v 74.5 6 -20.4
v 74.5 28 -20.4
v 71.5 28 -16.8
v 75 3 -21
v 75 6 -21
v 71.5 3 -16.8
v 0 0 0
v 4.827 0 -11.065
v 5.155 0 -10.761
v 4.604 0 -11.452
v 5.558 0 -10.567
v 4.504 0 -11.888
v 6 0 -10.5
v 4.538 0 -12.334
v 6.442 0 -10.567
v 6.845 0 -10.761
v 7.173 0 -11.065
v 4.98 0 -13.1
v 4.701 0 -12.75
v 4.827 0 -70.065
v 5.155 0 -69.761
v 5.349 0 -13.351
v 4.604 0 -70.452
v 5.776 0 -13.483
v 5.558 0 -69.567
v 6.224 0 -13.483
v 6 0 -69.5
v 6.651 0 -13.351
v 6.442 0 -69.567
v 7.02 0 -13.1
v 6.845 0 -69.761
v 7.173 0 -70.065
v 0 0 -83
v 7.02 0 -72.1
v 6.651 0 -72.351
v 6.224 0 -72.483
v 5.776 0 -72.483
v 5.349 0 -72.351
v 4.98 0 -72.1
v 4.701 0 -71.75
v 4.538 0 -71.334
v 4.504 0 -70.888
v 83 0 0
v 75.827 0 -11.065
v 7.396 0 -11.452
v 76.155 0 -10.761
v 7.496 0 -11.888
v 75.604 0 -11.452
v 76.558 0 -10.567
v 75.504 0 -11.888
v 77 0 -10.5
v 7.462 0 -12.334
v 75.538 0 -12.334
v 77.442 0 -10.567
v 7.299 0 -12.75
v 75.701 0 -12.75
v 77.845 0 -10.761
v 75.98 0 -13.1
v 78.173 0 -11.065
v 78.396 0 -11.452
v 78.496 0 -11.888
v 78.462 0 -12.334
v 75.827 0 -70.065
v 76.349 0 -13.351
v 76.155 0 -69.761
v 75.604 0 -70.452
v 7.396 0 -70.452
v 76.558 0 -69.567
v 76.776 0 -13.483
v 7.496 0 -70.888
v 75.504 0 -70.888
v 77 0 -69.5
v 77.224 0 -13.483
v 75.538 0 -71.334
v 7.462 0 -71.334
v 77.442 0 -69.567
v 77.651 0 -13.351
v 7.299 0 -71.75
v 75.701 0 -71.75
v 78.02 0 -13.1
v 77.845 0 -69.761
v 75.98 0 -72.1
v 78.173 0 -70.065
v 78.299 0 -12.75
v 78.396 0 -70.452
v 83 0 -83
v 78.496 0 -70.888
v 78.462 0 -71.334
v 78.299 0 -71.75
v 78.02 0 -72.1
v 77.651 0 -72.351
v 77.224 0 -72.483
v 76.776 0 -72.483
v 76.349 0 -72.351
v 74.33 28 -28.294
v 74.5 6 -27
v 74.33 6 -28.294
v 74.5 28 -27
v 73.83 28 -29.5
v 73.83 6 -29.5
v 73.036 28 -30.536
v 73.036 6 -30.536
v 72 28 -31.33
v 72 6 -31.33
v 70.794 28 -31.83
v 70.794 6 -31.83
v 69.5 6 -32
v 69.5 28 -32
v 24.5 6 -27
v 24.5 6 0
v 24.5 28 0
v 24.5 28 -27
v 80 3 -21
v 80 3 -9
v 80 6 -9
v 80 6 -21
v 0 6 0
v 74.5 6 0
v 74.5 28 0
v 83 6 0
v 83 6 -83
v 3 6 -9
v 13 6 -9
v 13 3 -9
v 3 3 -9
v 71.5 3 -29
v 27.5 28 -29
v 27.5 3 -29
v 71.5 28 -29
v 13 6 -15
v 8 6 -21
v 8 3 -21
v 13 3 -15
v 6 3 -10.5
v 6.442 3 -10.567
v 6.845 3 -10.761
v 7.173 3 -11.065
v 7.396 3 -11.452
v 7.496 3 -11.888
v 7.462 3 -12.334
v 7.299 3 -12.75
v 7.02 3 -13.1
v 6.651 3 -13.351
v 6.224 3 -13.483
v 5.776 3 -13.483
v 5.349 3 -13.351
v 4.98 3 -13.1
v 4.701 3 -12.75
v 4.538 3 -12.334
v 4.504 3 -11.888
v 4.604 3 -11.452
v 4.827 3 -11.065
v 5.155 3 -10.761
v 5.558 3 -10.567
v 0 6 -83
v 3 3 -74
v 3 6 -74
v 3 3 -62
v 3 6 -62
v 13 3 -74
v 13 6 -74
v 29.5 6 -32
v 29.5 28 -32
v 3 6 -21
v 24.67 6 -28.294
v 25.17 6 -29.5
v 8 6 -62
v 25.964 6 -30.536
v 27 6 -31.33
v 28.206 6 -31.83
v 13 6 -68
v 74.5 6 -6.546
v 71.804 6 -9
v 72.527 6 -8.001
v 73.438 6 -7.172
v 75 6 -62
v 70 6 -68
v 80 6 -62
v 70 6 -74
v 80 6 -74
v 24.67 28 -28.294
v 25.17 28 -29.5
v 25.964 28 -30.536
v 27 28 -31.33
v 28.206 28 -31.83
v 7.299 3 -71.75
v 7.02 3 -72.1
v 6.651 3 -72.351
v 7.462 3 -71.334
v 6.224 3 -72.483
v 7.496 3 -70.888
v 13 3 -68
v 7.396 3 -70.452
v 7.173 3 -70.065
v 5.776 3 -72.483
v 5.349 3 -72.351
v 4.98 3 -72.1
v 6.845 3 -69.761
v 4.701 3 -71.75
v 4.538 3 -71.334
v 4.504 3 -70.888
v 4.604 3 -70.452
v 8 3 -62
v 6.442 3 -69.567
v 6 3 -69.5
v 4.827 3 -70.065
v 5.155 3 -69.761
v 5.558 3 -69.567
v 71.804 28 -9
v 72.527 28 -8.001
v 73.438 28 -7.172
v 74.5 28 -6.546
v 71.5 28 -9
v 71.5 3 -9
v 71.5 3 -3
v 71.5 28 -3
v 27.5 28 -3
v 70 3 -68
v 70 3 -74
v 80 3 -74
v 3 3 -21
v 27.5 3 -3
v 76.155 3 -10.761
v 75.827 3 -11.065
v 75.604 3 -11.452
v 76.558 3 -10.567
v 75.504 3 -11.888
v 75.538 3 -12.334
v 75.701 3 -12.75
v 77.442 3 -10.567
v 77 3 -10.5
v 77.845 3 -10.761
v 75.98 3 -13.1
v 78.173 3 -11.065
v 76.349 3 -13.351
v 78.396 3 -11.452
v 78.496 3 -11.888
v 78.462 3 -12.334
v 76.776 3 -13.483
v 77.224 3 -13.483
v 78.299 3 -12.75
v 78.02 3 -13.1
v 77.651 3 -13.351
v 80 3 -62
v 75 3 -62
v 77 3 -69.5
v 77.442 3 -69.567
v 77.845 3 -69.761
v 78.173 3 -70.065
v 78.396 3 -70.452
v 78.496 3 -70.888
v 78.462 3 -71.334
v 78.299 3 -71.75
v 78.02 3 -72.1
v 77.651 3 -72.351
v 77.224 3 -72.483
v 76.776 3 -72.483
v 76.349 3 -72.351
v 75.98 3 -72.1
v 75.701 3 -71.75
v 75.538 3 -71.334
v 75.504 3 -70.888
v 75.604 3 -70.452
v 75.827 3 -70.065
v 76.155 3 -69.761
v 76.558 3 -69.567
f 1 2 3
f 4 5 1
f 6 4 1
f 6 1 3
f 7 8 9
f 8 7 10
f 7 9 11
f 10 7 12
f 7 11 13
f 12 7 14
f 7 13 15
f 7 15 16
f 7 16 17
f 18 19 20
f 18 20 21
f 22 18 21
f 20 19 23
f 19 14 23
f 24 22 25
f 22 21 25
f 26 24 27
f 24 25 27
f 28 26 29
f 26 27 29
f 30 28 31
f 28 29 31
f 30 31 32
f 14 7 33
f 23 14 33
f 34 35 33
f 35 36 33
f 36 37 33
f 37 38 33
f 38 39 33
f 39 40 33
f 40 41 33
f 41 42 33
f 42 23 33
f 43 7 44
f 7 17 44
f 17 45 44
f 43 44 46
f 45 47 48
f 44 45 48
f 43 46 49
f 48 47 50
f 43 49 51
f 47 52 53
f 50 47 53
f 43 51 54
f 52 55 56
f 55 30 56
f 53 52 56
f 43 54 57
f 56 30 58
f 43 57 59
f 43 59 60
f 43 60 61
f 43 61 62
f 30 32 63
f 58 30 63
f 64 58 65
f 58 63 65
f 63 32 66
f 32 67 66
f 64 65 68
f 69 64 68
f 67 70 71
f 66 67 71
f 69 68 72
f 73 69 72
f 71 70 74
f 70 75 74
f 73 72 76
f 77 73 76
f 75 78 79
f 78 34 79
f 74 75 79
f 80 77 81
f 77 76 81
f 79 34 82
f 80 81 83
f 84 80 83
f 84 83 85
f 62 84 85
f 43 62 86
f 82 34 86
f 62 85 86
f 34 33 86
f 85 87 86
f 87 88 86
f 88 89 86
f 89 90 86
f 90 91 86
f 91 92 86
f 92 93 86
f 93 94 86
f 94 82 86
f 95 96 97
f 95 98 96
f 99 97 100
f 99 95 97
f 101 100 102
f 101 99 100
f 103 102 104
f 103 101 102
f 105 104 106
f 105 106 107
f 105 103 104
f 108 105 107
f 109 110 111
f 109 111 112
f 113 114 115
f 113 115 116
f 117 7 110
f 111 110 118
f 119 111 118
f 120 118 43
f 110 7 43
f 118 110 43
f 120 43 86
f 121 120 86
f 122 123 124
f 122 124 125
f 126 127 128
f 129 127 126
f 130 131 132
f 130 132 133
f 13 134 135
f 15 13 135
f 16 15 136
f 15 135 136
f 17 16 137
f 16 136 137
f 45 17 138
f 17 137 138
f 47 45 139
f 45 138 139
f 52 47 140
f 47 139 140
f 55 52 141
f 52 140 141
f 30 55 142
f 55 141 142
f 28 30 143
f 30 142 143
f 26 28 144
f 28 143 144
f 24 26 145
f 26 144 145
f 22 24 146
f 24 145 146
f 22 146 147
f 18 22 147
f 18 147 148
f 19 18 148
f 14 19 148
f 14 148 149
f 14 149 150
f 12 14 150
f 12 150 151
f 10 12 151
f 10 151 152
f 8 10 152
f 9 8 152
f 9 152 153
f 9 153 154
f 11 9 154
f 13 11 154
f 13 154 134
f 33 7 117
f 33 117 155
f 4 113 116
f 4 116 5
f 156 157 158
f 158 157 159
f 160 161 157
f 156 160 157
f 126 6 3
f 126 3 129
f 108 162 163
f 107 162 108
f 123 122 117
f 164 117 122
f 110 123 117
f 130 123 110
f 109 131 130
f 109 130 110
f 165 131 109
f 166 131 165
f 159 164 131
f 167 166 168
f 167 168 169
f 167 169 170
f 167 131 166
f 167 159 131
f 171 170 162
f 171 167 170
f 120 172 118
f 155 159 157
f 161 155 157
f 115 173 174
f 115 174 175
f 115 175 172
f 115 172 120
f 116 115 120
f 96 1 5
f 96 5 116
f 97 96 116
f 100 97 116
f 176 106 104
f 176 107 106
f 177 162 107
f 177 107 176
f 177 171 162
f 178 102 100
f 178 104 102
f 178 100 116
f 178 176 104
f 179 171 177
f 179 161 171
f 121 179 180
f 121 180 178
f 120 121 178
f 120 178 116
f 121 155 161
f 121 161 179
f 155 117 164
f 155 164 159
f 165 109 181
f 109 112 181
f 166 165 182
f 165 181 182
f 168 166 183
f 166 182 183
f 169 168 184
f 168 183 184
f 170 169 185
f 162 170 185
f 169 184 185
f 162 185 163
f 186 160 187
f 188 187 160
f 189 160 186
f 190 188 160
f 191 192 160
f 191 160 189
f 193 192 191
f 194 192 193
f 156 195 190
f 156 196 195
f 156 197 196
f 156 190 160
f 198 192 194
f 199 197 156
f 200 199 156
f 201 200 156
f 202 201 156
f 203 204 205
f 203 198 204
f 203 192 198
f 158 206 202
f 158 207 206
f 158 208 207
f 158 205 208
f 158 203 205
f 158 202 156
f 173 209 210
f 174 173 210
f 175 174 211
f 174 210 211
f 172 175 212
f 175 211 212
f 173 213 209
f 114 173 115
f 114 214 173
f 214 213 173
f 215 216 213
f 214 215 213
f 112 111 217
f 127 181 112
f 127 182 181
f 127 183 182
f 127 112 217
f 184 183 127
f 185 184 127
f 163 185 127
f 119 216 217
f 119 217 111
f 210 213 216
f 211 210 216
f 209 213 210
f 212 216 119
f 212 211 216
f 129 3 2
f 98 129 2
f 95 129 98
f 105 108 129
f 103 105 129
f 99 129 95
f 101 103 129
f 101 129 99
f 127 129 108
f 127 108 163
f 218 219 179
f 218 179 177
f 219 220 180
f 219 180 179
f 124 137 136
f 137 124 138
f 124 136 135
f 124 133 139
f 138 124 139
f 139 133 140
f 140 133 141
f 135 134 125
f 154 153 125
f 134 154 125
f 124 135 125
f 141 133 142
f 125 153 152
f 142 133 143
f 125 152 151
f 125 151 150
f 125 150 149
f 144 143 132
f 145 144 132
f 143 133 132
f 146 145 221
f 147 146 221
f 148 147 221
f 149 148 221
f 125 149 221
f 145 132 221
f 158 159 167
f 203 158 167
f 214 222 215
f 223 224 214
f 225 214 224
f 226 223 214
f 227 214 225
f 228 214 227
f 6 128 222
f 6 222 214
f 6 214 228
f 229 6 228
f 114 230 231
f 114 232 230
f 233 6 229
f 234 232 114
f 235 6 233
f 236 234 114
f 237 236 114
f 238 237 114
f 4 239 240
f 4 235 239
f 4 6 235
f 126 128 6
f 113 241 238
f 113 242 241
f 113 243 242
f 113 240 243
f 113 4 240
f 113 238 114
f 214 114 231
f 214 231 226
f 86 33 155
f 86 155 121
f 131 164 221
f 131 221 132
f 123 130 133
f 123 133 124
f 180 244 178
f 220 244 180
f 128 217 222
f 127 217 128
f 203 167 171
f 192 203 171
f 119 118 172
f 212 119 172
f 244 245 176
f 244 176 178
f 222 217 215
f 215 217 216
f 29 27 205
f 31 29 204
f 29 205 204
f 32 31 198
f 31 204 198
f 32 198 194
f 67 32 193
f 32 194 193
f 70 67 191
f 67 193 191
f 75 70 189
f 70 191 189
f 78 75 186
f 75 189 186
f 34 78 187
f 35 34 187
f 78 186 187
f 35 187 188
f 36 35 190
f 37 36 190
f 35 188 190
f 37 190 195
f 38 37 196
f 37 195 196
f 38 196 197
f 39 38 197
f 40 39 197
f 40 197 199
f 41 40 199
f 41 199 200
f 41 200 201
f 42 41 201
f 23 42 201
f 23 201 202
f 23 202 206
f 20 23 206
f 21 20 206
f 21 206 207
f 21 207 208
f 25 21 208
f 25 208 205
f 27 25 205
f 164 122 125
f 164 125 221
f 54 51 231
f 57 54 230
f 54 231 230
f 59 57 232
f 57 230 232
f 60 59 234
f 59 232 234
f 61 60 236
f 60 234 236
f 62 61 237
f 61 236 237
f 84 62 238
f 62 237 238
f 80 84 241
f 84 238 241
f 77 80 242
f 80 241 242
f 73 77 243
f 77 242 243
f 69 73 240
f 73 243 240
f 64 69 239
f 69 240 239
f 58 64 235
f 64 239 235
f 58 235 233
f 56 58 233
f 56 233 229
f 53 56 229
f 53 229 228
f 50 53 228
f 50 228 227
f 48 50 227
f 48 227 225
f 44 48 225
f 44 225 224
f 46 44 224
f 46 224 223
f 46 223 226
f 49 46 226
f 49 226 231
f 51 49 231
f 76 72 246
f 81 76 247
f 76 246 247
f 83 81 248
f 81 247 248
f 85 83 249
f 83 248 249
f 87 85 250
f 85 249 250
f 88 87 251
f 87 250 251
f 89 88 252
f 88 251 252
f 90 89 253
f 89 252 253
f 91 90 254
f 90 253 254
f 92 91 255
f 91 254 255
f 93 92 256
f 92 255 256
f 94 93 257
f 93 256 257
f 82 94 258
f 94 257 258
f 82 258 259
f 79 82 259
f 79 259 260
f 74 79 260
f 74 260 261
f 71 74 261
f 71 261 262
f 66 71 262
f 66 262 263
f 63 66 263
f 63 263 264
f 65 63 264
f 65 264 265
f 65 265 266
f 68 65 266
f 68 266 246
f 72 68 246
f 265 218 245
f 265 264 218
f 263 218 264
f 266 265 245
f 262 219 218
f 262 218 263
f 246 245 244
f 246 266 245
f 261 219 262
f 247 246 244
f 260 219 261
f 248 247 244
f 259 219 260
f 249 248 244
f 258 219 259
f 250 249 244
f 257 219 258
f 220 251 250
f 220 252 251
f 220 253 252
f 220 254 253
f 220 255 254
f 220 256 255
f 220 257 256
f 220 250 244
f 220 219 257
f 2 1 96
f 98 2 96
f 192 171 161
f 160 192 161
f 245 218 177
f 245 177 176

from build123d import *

# Parameters (mm, degrees)
SKETCH1_W                 = 83
SKETCH1_H                 = 83
BOSS_EXTRUDE1_DEPTH       = 6
SKETCH2_R                 = 1.5
CUT_EXTRUDE1_DEPTH        = 118.532974097
SKETCH4_R                 = 1.5
CUT_EXTRUDE4_DEPTH        = 3
BOSS_EXTRUDE2_START       = -3
BOSS_EXTRUDE2_OUTLINE_R   = 1.5
BOSS_EXTRUDE2_DEPTH       = 3
BOSS_EXTRUDE2_2_OUTLINE_W = 50
BOSS_EXTRUDE2_2_OUTLINE_H = 32
BOSS_EXTRUDE2_2_DEPTH     = 22
SKETCH6_W                 = 44
SKETCH6_H                 = 26
CUT_EXTRUDE5_DEPTH        = 25
CUT_EXTRUDE14_DEPTH       = 22
CUT_EXTRUDE15_DEPTH       = 121.012499349
FILLET2_R                 = 5


# Read off the part's stored shape, not the designer's step: Boss-Extrude2
with BuildPart() as part:
    # Sketch1 → Boss-Extrude1 (new body)
    with BuildSketch(Plane(origin=(0, 0, 0), x_dir=(1, 0, 0), z_dir=(0, 1, 0))):
        with Locations((41.5, 41.5)):
            Rectangle(SKETCH1_W, SKETCH1_H)
    extrude(amount=BOSS_EXTRUDE1_DEPTH)

    # Sketch2 → Cut-Extrude1 (cut, through all)
    with BuildSketch(Plane(origin=(0, 6, 0), x_dir=(1, 0, 0), z_dir=(0, 1, 0))):
        with Locations(Location((6, 71, 0), (0, 0, 270))):
            Circle(SKETCH2_R)
        with Locations(Location((6, 12, 0), (0, 0, 270))):
            Circle(SKETCH2_R)
        with Locations(Location((77, 12, 0), (0, 0, 270))):
            Circle(SKETCH2_R)
        with Locations(Location((77, 71, 0), (0, 0, 270))):
            Circle(SKETCH2_R)
    extrude(amount=-CUT_EXTRUDE1_DEPTH, mode=Mode.SUBTRACT)

    # Sketch4 → Cut-Extrude4 (cut)
    with BuildSketch(Plane(origin=(0, 6, 0), x_dir=(1, 0, 0), z_dir=(0, 1, 0))):
        Polygon((13, 15), (13, 9), (3, 9), (3, 21), (8, 21), align=None)
        with Locations(Location((6, 12, 0), (0, 0, 270))):
            Circle(SKETCH4_R, mode=Mode.SUBTRACT)
    cut_extrude4 = extrude(amount=-CUT_EXTRUDE4_DEPTH, mode=Mode.SUBTRACT)

    # Mirror2: Cut-Extrude4 across plane
    add(cut_extrude4.mirror(Plane.XY.offset(-41.5)), mode=Mode.SUBTRACT)

    # Boss-Extrude2 outline → Boss-Extrude2 (cut)
    # profile 1 of 2: a face of its own
    with BuildSketch(Plane(origin=(0, 6, 0), x_dir=(1, 0, 0), z_dir=(0, 1, 0)).offset(BOSS_EXTRUDE2_START)):
        Polygon((75, 21), (70, 15), (70, 9), (80, 9), (80, 21), align=None)
        with Locations((77, 12)):
            Circle(BOSS_EXTRUDE2_OUTLINE_R, mode=Mode.SUBTRACT)
    # profile 2 of 2: a face of its own
    with BuildSketch(Plane(origin=(0, 6, 0), x_dir=(1, 0, 0), z_dir=(0, 1, 0)).offset(BOSS_EXTRUDE2_START)):
        Polygon((75, 62), (80, 62), (80, 74), (70, 74), (70, 68), align=None)
        with Locations((77, 71)):
            Circle(BOSS_EXTRUDE2_OUTLINE_R, mode=Mode.SUBTRACT)
    extrude(amount=BOSS_EXTRUDE2_DEPTH, mode=Mode.SUBTRACT)

    # Boss-Extrude2 2 outline → Boss-Extrude2 2 (add)
    with BuildSketch(Plane(origin=(0, 6, 0), x_dir=(1, 0, 0), z_dir=(0, 1, 0))):
        with Locations((49.5, 16)):
            Rectangle(BOSS_EXTRUDE2_2_OUTLINE_W, BOSS_EXTRUDE2_2_OUTLINE_H)
    extrude(amount=BOSS_EXTRUDE2_2_DEPTH)

    # Sketch6 → Cut-Extrude5 (cut)
    with BuildSketch(Plane(origin=(0, 28, 0), x_dir=(1, 0, 0), z_dir=(0, 1, 0))):
        with Locations((49.5, 16)):
            Rectangle(SKETCH6_W, SKETCH6_H)
    extrude(amount=-CUT_EXTRUDE5_DEPTH, mode=Mode.SUBTRACT)

    # Sketch8 → Cut-Extrude14 (cut)
    with BuildSketch(Plane(origin=(0, 28, 0), x_dir=(1, 0, 0), z_dir=(0, 1, 0))):
        with BuildLine():
            Line((74.5, 9), (74.5, 17.454356057))
            ThreePointArc((74.5, 17.454356057), (72.718007844, 16.202920792), (71.5, 14.397915762))
            Line((71.5, 14.397915762), (71.5, 9.602084238))
            ThreePointArc((71.5, 9.602084238), (71.64345769, 9.296769621), (71.803847577, 9))
            Line((71.803847577, 9), (74.5, 9))
        make_face()
        with BuildLine():
            Line((74.5, 6.545643943), (74.5, 9))
            Line((74.5, 9), (71.803847577, 9))
            ThreePointArc((71.803847577, 9), (72.960983233, 7.563070481), (74.5, 6.545643943))
        make_face()
    extrude(amount=-CUT_EXTRUDE14_DEPTH, mode=Mode.SUBTRACT)

    # Sketch13 → Cut-Extrude15 (cut, through all)
    with BuildSketch(Plane(origin=(0, 3, 0), x_dir=(1, 0, 0), z_dir=(0, 1, 0))):
        Polygon((71.5, 9), (80, 9), (80, 21), (75, 21), (71.5, 16.8), (71.5, 29), (27.5, 29), (27.5, 3), (71.5, 3), align=None)
    extrude(amount=CUT_EXTRUDE15_DEPTH, mode=Mode.SUBTRACT)

    # Fillet2
    fillet2_edges = [part.edges().sort_by_distance(p)[0] for p in [
        (74.5, 17, -32),
        (24.5, 17, -32),
    ]]
    fillet(fillet2_edges, radius=FILLET2_R)


solid = part.part
